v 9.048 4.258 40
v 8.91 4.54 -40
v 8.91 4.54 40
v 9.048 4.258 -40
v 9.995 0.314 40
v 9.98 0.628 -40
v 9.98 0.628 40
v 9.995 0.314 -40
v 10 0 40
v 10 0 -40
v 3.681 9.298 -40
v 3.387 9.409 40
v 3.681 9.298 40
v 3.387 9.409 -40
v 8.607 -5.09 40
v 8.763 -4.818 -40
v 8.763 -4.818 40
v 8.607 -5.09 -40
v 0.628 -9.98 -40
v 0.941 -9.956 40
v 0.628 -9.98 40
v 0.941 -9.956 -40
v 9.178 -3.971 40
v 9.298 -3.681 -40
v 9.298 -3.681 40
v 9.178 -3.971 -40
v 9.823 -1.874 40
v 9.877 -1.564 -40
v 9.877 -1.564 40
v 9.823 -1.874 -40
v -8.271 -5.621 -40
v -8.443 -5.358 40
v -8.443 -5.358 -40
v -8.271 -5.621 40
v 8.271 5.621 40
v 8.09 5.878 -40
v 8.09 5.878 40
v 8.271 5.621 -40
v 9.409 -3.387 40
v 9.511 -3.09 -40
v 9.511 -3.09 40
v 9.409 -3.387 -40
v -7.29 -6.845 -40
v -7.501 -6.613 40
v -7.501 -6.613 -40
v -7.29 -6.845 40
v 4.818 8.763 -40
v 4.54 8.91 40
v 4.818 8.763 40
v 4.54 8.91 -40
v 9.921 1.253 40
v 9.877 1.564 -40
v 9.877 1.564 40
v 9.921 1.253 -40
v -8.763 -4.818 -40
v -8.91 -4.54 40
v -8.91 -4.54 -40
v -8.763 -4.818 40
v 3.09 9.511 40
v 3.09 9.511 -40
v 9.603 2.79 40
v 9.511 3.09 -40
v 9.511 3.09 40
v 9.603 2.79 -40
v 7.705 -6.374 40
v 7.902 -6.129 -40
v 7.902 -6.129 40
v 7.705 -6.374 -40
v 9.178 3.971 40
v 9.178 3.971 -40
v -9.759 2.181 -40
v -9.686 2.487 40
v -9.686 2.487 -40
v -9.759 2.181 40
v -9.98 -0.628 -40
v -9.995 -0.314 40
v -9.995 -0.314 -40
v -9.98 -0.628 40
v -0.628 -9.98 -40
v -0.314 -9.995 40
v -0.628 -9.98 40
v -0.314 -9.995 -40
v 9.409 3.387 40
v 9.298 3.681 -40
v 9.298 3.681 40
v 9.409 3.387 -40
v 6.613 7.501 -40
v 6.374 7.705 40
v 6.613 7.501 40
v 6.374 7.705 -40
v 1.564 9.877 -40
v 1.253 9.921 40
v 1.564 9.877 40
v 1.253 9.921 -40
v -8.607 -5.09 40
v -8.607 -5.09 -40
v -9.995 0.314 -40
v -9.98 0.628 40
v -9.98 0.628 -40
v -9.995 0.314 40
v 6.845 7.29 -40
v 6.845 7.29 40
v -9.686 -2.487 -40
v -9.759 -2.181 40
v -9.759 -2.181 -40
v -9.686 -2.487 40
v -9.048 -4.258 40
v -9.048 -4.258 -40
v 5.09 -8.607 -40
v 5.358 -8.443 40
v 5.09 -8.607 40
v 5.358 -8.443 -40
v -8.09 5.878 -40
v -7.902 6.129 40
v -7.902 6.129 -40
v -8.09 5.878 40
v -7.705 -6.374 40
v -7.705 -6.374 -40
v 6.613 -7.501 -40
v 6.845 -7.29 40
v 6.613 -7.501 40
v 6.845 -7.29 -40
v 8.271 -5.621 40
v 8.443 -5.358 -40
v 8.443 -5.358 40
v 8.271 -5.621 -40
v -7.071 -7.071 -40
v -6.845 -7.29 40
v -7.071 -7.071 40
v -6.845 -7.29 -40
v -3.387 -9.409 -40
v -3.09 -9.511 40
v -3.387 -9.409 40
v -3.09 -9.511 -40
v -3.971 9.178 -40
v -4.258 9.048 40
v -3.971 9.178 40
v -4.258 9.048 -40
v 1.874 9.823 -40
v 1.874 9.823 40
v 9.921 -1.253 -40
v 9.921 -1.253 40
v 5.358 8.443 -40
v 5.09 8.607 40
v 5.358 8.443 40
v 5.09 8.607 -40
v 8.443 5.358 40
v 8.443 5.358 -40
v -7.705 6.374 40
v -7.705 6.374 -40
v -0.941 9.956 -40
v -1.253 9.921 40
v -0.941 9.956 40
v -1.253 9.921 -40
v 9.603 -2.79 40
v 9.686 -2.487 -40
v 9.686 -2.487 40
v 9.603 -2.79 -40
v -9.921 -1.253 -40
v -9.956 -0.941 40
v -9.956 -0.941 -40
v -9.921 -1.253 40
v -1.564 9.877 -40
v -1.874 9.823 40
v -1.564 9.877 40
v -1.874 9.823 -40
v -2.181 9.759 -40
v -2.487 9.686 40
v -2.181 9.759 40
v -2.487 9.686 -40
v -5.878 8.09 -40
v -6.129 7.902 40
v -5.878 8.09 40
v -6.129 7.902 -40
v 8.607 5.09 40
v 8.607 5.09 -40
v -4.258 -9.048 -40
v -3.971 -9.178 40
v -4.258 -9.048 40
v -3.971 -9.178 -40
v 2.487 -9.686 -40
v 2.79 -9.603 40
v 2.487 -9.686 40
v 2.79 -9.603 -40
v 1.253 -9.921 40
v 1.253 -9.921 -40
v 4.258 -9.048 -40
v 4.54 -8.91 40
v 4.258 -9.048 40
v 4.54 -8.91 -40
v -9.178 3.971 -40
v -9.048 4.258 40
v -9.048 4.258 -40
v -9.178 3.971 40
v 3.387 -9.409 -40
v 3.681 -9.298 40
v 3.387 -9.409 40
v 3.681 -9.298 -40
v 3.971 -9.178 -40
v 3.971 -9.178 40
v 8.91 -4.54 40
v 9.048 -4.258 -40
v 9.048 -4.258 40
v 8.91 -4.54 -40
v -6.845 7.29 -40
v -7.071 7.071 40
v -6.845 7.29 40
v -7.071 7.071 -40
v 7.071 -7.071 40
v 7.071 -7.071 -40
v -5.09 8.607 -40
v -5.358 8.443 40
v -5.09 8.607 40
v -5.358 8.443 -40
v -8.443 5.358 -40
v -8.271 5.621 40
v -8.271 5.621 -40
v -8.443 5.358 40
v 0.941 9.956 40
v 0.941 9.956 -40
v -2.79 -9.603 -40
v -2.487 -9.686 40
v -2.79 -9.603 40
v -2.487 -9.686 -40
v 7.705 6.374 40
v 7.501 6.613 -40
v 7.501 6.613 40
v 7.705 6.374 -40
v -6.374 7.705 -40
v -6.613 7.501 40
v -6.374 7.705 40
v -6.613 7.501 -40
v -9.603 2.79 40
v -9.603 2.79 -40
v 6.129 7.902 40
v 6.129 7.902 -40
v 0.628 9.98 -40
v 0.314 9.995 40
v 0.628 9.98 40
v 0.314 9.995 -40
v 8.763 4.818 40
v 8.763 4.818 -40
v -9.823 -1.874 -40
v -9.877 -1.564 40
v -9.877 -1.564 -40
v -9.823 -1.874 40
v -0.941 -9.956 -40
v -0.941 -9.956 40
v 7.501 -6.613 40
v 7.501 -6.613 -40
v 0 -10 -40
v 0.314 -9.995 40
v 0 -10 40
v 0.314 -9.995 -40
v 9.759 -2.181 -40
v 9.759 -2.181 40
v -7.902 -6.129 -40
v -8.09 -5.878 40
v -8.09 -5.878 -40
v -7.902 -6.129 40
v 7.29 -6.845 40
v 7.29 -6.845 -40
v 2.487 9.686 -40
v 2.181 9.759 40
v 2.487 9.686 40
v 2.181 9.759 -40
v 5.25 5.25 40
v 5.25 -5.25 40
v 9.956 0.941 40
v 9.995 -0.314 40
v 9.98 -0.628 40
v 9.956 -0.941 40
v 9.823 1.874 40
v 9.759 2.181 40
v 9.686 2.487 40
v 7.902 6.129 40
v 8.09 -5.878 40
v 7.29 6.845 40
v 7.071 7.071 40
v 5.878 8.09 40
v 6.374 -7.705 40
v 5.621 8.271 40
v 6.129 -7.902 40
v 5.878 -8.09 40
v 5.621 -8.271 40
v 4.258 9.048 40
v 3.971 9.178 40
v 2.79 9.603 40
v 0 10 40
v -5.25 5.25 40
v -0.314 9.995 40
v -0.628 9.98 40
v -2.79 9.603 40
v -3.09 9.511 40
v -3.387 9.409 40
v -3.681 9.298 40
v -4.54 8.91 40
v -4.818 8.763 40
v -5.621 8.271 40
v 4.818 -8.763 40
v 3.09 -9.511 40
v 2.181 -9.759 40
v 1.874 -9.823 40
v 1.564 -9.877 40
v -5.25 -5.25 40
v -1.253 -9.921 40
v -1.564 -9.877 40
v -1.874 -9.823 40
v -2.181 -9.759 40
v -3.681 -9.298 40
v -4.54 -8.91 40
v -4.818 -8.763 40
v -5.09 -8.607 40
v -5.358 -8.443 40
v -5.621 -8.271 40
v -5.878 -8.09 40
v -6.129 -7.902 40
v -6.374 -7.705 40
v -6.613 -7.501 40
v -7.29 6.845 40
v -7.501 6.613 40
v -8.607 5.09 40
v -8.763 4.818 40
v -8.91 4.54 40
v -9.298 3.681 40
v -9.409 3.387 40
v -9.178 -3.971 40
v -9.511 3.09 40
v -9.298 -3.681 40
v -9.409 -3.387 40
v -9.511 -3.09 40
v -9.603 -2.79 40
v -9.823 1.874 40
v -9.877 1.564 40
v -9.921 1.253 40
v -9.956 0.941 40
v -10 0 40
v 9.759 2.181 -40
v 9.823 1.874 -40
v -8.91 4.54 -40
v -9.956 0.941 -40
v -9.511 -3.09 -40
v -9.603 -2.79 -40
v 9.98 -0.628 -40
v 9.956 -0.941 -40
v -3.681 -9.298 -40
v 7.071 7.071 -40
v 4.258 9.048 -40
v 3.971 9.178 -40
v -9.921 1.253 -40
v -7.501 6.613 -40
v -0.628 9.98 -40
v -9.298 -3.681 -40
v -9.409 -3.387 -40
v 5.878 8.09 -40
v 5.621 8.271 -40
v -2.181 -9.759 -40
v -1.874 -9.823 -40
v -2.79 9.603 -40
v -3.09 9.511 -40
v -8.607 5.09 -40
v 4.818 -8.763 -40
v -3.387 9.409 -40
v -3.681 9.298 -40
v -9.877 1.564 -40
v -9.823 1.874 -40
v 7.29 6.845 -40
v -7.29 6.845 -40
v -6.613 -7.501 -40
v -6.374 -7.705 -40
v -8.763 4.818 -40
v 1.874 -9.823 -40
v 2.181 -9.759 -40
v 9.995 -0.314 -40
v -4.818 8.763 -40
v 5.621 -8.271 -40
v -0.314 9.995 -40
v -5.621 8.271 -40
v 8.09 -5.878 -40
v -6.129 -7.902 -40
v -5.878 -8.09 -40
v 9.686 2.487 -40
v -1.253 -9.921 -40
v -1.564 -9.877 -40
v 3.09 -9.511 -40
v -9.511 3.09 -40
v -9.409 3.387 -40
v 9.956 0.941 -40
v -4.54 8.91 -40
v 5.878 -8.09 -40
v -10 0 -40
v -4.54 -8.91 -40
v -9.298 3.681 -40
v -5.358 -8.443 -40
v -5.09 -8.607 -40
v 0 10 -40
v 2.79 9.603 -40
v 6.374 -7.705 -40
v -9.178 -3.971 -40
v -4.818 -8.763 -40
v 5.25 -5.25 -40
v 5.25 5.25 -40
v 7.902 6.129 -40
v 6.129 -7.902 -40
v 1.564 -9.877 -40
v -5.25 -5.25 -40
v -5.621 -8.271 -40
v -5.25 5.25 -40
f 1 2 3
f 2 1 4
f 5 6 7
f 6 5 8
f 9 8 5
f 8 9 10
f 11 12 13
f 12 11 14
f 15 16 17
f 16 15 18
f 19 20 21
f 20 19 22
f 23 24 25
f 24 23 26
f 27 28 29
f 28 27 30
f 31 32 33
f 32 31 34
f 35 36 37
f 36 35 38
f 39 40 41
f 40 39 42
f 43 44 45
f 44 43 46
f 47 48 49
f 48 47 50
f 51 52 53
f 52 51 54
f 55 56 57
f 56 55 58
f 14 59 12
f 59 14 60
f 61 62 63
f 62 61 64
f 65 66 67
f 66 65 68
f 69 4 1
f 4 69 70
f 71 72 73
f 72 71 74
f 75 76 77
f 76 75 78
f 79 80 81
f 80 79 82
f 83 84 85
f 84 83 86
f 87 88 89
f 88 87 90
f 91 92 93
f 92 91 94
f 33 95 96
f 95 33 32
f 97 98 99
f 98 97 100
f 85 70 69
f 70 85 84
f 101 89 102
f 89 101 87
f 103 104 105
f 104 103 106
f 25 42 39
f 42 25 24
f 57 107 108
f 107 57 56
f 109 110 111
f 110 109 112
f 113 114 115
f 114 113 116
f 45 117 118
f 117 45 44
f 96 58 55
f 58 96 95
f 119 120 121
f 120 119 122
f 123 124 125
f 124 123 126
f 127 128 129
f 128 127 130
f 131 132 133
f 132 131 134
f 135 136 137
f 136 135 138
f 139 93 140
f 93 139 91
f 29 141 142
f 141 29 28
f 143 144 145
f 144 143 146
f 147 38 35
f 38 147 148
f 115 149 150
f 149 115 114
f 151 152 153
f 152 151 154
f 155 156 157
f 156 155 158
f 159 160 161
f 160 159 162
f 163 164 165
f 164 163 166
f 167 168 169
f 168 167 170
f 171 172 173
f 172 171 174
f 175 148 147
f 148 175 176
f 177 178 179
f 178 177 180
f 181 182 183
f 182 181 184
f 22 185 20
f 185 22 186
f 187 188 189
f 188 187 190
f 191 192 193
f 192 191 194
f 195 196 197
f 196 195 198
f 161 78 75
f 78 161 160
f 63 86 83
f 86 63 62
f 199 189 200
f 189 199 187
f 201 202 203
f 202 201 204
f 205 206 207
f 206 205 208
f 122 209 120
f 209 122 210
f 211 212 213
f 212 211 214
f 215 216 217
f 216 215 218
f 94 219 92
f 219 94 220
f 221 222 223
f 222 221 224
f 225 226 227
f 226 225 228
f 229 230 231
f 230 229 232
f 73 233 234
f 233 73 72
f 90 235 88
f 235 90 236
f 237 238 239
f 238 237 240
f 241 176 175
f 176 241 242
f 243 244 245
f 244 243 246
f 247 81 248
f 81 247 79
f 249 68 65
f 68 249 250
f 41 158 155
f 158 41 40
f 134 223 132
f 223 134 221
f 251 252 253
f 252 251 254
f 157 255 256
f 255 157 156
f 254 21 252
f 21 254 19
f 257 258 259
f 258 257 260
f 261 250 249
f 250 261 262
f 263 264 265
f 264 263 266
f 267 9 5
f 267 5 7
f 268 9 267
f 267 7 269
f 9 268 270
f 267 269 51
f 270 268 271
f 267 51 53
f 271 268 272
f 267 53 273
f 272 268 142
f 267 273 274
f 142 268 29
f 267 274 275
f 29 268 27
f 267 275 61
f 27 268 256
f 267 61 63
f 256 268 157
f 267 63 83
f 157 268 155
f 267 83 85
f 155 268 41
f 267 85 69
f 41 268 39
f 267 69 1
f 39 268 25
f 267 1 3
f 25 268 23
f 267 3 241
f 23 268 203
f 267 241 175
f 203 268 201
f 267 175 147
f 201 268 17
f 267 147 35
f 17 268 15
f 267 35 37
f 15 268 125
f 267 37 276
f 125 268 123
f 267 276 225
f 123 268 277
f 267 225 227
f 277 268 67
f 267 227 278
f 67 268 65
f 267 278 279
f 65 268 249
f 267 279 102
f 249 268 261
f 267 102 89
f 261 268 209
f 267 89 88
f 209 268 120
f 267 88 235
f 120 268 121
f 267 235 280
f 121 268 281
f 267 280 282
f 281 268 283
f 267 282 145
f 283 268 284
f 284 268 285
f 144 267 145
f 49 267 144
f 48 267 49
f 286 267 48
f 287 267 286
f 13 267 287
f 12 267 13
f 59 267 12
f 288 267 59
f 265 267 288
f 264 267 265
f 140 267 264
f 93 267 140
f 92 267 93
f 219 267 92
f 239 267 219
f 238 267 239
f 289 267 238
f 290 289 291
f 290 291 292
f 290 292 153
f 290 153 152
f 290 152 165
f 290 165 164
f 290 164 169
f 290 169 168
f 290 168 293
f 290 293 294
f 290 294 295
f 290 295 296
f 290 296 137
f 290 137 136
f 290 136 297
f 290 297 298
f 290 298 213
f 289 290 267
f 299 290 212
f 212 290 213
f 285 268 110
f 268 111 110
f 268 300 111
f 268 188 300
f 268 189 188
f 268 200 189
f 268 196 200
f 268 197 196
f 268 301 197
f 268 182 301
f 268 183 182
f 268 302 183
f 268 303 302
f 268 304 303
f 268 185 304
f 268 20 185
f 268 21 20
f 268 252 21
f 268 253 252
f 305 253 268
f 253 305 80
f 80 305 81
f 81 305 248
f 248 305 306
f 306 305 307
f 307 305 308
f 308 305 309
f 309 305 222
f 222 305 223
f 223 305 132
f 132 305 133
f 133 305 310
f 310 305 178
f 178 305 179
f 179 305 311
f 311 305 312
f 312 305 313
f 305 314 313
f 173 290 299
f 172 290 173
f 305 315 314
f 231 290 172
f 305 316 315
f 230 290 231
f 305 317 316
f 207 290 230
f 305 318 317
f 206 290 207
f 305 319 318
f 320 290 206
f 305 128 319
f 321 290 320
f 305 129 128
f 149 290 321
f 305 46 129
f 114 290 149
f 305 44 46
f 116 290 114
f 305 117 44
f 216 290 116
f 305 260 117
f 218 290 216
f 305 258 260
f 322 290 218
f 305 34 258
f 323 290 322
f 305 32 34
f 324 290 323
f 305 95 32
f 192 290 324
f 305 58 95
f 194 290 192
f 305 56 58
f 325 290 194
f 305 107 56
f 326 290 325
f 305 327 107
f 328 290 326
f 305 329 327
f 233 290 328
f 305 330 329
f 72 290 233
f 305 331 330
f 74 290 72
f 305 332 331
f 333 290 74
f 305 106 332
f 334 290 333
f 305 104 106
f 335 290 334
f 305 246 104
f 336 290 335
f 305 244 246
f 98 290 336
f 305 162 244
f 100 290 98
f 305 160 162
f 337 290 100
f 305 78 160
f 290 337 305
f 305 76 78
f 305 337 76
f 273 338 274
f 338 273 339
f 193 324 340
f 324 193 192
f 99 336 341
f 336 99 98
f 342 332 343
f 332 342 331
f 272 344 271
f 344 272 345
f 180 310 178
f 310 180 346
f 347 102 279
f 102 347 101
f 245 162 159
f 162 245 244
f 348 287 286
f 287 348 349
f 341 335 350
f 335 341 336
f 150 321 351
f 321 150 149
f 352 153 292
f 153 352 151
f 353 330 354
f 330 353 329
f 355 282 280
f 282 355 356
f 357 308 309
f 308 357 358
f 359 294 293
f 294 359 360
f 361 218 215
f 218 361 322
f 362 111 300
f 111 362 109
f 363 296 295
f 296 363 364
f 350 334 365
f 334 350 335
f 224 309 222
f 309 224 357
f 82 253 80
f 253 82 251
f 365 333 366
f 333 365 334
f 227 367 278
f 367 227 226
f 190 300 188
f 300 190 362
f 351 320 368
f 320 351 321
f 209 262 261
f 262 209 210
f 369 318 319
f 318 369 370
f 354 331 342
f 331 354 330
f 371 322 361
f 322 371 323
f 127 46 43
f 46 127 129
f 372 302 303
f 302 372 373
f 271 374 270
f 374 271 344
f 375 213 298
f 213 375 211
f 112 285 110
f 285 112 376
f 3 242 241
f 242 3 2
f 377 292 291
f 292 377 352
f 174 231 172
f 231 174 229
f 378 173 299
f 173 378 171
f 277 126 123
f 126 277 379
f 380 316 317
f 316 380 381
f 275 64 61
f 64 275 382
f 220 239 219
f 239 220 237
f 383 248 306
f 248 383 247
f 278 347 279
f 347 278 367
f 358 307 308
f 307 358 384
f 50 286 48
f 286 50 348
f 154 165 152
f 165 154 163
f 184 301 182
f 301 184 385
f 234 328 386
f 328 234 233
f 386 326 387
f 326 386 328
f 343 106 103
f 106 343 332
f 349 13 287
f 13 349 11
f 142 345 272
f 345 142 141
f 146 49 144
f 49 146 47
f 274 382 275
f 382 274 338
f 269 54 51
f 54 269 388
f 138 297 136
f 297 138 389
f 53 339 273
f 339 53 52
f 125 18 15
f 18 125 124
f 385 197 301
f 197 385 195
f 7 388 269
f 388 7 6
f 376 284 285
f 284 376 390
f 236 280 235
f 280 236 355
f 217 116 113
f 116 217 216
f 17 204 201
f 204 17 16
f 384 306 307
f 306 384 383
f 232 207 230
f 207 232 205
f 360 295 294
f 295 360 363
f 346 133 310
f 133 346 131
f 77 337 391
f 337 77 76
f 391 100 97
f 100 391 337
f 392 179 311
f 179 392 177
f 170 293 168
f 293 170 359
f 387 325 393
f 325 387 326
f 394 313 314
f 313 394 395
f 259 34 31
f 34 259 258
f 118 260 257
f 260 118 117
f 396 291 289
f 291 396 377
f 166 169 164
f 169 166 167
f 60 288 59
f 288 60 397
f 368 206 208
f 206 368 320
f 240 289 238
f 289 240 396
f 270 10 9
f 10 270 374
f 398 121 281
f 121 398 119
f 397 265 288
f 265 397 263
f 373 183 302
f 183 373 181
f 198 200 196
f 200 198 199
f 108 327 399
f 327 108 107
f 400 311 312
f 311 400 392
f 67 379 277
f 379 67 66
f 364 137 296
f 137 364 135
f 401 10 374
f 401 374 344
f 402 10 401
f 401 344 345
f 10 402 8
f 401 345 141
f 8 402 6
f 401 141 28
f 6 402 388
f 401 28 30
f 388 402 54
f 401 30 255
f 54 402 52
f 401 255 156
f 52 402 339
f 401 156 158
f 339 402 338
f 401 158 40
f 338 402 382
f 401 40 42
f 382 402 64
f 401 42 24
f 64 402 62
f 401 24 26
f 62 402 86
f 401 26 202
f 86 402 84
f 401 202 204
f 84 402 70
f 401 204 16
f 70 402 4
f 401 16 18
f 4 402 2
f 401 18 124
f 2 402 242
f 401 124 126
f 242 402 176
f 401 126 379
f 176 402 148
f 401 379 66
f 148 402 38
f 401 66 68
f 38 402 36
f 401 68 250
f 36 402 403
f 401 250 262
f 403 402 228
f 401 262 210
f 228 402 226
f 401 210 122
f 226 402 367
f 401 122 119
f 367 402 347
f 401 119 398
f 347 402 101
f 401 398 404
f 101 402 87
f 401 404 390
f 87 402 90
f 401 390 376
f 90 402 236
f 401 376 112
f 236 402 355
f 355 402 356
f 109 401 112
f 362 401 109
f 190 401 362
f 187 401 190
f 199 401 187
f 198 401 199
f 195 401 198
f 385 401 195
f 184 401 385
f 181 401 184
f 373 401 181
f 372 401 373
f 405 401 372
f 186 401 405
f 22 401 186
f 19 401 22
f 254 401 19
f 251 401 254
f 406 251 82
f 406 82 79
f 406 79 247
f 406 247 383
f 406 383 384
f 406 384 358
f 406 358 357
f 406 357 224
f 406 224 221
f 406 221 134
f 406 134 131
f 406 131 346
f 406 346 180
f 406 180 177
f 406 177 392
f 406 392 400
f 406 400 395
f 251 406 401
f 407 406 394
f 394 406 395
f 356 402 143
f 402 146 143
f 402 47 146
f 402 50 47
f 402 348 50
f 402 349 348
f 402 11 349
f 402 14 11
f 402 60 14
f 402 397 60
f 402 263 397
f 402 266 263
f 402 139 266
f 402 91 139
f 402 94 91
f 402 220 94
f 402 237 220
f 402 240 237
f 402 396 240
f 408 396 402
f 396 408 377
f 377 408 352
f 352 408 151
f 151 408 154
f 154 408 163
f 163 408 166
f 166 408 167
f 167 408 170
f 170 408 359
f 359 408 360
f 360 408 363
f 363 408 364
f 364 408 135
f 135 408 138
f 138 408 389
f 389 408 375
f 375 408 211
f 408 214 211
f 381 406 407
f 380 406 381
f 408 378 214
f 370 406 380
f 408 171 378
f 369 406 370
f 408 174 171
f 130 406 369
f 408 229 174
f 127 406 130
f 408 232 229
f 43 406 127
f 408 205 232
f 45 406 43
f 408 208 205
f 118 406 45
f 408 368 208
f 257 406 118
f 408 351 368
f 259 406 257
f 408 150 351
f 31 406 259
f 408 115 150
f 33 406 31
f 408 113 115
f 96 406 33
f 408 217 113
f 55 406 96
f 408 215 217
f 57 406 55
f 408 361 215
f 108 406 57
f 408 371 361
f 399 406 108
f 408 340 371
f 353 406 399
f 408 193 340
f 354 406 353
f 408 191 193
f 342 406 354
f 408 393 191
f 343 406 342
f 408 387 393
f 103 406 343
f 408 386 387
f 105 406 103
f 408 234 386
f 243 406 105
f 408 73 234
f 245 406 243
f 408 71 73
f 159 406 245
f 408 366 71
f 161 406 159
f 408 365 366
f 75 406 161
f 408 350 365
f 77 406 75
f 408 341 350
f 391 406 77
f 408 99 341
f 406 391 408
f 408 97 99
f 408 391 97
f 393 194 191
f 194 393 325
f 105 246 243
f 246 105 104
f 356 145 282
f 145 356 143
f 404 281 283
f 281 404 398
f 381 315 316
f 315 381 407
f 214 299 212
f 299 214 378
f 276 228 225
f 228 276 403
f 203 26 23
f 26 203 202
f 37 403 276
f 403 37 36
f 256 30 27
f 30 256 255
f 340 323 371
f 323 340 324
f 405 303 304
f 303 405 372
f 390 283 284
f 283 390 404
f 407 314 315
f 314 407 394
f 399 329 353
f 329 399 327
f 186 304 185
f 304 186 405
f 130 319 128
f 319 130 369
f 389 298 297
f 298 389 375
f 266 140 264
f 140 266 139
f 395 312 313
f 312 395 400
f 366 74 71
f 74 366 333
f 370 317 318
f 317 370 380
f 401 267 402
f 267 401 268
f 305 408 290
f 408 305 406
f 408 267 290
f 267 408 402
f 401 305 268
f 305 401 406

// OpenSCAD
// quick case and button for 5-way navigation switch
// https://www.adafruit.com/product/504
// adafruit product id 504


switch_hole_d=5.9;


switch_base_xyz=[10.5,10.5,3.7];

case_body_d=20;
case_hole_d=9;
case_body_h=80;

thickness=2;

$fn=200;

/*

Create a case that can be held in hand for use.  The body of the case is a cylinder.  It has a ledge for the switch to sit on and a hole big enough for wiring to fit through.  A lit fits over the switch once it's resting on the ledge
*/

difference()
{
    cylinder(d=case_body_d,h=case_body_h,center=true);
    
cube([switch_base_xyz[0],switch_base_xyz[1],case_body_h+10],center=true);    
}
